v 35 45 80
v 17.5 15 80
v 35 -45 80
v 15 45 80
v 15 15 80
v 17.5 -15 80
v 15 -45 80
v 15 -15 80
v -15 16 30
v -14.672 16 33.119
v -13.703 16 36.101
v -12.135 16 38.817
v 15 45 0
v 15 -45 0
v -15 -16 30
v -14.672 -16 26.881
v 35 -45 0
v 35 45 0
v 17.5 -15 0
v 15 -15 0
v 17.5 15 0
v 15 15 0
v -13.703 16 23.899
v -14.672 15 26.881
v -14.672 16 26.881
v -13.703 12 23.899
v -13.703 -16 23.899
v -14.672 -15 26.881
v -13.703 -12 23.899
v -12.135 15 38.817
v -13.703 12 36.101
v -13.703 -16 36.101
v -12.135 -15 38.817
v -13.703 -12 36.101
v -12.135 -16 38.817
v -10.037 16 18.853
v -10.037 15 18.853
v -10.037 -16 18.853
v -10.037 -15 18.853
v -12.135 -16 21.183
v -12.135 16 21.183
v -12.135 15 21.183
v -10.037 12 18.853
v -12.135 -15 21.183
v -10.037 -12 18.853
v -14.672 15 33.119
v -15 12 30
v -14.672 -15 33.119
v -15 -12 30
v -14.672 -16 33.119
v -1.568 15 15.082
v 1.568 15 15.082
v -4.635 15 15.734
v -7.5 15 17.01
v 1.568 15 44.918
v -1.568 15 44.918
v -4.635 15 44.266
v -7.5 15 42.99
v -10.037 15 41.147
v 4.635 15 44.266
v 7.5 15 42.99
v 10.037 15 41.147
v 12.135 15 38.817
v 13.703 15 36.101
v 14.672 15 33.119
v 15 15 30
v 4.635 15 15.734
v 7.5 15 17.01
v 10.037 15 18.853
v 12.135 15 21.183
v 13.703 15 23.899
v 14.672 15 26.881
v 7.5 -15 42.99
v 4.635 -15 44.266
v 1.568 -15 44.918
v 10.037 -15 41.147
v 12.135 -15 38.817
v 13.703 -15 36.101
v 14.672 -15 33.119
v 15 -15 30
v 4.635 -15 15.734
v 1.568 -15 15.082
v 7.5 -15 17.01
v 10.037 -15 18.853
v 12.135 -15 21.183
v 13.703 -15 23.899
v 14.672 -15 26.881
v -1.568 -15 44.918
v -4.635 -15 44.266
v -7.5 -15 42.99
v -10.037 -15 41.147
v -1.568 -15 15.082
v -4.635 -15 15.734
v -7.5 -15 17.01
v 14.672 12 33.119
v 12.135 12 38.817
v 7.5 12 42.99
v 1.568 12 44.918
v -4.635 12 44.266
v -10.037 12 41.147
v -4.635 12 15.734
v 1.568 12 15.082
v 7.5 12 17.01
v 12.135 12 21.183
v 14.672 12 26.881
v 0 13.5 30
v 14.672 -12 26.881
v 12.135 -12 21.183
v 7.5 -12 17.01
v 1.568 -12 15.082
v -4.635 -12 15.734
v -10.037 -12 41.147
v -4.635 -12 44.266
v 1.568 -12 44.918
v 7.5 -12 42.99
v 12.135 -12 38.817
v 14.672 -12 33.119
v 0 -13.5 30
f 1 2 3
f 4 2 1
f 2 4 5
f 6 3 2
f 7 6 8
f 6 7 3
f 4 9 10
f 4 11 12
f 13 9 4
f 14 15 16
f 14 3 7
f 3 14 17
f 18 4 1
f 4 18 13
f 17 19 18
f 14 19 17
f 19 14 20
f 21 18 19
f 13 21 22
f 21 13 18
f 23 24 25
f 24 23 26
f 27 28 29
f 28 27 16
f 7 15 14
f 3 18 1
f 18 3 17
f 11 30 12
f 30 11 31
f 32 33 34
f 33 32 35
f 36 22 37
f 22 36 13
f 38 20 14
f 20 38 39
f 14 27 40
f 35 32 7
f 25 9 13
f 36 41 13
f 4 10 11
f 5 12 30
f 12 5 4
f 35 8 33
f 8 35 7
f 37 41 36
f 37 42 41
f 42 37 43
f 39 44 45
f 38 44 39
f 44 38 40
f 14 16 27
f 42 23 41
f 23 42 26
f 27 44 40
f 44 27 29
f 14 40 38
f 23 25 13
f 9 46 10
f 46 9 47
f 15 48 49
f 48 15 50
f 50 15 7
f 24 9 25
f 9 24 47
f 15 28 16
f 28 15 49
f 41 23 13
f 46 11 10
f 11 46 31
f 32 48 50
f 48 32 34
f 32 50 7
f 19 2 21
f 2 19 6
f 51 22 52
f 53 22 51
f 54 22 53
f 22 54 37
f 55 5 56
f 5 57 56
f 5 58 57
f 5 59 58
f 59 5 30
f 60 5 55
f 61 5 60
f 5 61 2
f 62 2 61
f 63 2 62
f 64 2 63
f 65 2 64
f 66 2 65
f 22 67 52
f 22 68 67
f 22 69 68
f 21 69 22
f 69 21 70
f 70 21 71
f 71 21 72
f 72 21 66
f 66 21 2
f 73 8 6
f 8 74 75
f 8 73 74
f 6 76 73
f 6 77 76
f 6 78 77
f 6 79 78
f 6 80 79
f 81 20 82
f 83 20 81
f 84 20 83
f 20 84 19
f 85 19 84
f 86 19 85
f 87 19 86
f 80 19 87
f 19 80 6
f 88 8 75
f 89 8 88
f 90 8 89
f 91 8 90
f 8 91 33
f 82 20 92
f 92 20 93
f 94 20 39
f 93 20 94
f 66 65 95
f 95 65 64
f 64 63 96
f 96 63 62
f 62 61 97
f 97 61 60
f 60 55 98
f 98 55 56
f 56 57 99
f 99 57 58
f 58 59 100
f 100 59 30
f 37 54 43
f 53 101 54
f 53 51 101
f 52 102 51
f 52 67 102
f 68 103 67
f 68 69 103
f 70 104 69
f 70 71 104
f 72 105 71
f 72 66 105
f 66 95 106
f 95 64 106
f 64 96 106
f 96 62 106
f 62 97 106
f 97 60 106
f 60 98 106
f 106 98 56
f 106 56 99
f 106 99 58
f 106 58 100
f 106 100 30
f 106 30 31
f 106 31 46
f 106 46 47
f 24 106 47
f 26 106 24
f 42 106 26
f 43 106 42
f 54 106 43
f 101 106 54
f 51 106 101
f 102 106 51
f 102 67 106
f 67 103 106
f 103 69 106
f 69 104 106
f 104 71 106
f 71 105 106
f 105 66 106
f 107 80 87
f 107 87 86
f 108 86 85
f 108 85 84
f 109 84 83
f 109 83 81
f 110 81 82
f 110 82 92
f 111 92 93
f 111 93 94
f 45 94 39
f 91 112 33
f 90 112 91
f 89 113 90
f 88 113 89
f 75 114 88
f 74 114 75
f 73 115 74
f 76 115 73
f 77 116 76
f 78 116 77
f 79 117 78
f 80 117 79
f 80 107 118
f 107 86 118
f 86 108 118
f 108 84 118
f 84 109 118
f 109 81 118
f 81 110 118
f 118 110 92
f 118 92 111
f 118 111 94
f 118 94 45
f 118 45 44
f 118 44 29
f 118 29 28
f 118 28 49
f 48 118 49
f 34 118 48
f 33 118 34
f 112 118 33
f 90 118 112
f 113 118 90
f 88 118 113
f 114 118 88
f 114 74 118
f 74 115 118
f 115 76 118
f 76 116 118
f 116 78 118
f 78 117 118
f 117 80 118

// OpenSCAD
module phone(){
    hull(){
        translate([0,-35,0]) cylinder(r=6,h=170);
        translate([0,35,0]) cylinder(r=6,h=170);
    }
}
 

module angle_lock(h=3,radius=15,steps=30){
    angle = 360/steps;
    points = [
        for(i=[0:angle:360-1])
            [cos(i)*radius,sin(i)*radius,-1],
        for(i=[0:angle:360-1])
            [cos(i)*radius,sin(i)*radius,h*((i/angle)%2)],[0,0,h/2]
    ];
    faces = [
        [for(i=[0:1:steps-1]) i],// bottom
        for(i=[0:1:steps-1]) 
                [i+steps,((i+1)%steps)+steps, (i+1)%steps,i],
        for(i=[0:1:steps-1])
           [ steps*2,((i+1)%steps)+steps,i+steps],// top

    ];
    polyhedron(points,faces,convexity=5);
}
module support(){
    largeur = 85;
    difference(){
        translate([-7.5,-largeur/2,0]) cube([16,largeur,120]);
        translate([0,0,4]) phone();
        cube([20,20,9],center=true);
        translate([0,-36,10]) cube([20,72,170]);
    }
}
module arm(){
    difference(){
        hull(){
            translate([-40,-15,15]) rotate([90,0,0]) cylinder(r=15,h=4  );
            translate([-9,-35,25]) cube([3,10,30]);
        }
        
    }
    
}
module screw_hole(){
    translate([0,0,0]) 
        rotate([90,0,0]) 
        cylinder(r=4,h=100, center=true);
    translate([0,25,0]) 
        rotate([90,0,0]) 
        cylinder(r=8,h=10,center=true);
    translate([0,-25,0]) 
        rotate([90,0,0]) 
        cylinder(r=8,h=10,center=true);    
    }
    
module full_support(){
    support();
    translate([-40,0,15]) rotate([90,0,0]){
        translate([0,0,-15]) 
            angle_lock();
        translate([0,0,15]) 
            rotate([0,180,0]) 
            angle_lock();
    }
    arm();
    mirror([0,1,0]) arm();
}
module tail_support(){
        translate([-20,0,-5]) difference(){ 
        rotate([0,8,0]) 
            translate([-15,-12,-100]) cube([15,24,100]);
        translate([-30,-13,-105]) cube([15,26,110]);
    }
}
module pillar(){
    difference(){
        translate([0,0,30]) rotate([90,0,0]){
            translate([0,0,12]) rotate([0,0,6]) angle_lock();
            translate([0,0,-12]) rotate([0,180,6]) angle_lock();
            hull(){
                cylinder(r=15,h=24,center=true);
                translate([0,-30,0]) cube([30,1,24],center=true);
            }
        }
        translate([0,0,-3]) fixture(0.5);
        translate([0,0,30]) screw_hole();

    }
}

module fixture(tolerance=0){
    for(i = [0:36:360]){
        rotate([0,0,i]) translate([8,0,-1]) cylinder(r=2+tolerance,h=21);
        }
    translate([0,0,-1]) cylinder(r=9+tolerance,h=21);
    translate([0,0,19]) cylinder(r1=8+tolerance,r2=1+tolerance,h=9+tolerance);
    
    }
module plate(){
    difference(){
        union(){
            hull(){
                for (i=[0:90:360]){
                    rotate([0,0,i+45]) 
                        translate([20,0,0]) 
                        sphere(r=4);
                }
            }
            fixture(0);
        }
        translate([-20,-20,-4])cube([40,40,4]);
        for (i=[0:90:360]){
            rotate([0,0,i+45]){ 
                translate([17,0,-1]) 
                    cylinder(r=2,h=10);
                translate([17,0,2]) 
                    cylinder(r=4,h=10);
            }
        }
    }
}

module magnet(h=2.75,l=59,t=9.75,tolerance=0.5){
    cube([h+tolerance,l+tolerance,t+tolerance],center=true);
    }
    
* translate([0,0,-5]) union(){
    translate([0,0,5]) pillar();    
    plate();
}
  
translate([0,15,30]) rotate([90,0,0]) angle_lock();
translate([0,-15,30]) rotate([-90,0,0]) angle_lock();
difference(){
    hull(){
        translate([0,0,30]) 
            rotate([90,0,0]) cylinder(r=15,h=32,center=true);
        translate([25,0,40]) cube([20,90,80],center=true);
    }
    translate([0,0,50]) cube([35,30,140],center=true);
}
%translate([20,0,0]) difference(){    
    translate([0,-40,0]) cube([10,80,160]);
    for(i = [0:11]){    
     translate([2,0,10+i*13]) magnet(h=6);
    }
}
